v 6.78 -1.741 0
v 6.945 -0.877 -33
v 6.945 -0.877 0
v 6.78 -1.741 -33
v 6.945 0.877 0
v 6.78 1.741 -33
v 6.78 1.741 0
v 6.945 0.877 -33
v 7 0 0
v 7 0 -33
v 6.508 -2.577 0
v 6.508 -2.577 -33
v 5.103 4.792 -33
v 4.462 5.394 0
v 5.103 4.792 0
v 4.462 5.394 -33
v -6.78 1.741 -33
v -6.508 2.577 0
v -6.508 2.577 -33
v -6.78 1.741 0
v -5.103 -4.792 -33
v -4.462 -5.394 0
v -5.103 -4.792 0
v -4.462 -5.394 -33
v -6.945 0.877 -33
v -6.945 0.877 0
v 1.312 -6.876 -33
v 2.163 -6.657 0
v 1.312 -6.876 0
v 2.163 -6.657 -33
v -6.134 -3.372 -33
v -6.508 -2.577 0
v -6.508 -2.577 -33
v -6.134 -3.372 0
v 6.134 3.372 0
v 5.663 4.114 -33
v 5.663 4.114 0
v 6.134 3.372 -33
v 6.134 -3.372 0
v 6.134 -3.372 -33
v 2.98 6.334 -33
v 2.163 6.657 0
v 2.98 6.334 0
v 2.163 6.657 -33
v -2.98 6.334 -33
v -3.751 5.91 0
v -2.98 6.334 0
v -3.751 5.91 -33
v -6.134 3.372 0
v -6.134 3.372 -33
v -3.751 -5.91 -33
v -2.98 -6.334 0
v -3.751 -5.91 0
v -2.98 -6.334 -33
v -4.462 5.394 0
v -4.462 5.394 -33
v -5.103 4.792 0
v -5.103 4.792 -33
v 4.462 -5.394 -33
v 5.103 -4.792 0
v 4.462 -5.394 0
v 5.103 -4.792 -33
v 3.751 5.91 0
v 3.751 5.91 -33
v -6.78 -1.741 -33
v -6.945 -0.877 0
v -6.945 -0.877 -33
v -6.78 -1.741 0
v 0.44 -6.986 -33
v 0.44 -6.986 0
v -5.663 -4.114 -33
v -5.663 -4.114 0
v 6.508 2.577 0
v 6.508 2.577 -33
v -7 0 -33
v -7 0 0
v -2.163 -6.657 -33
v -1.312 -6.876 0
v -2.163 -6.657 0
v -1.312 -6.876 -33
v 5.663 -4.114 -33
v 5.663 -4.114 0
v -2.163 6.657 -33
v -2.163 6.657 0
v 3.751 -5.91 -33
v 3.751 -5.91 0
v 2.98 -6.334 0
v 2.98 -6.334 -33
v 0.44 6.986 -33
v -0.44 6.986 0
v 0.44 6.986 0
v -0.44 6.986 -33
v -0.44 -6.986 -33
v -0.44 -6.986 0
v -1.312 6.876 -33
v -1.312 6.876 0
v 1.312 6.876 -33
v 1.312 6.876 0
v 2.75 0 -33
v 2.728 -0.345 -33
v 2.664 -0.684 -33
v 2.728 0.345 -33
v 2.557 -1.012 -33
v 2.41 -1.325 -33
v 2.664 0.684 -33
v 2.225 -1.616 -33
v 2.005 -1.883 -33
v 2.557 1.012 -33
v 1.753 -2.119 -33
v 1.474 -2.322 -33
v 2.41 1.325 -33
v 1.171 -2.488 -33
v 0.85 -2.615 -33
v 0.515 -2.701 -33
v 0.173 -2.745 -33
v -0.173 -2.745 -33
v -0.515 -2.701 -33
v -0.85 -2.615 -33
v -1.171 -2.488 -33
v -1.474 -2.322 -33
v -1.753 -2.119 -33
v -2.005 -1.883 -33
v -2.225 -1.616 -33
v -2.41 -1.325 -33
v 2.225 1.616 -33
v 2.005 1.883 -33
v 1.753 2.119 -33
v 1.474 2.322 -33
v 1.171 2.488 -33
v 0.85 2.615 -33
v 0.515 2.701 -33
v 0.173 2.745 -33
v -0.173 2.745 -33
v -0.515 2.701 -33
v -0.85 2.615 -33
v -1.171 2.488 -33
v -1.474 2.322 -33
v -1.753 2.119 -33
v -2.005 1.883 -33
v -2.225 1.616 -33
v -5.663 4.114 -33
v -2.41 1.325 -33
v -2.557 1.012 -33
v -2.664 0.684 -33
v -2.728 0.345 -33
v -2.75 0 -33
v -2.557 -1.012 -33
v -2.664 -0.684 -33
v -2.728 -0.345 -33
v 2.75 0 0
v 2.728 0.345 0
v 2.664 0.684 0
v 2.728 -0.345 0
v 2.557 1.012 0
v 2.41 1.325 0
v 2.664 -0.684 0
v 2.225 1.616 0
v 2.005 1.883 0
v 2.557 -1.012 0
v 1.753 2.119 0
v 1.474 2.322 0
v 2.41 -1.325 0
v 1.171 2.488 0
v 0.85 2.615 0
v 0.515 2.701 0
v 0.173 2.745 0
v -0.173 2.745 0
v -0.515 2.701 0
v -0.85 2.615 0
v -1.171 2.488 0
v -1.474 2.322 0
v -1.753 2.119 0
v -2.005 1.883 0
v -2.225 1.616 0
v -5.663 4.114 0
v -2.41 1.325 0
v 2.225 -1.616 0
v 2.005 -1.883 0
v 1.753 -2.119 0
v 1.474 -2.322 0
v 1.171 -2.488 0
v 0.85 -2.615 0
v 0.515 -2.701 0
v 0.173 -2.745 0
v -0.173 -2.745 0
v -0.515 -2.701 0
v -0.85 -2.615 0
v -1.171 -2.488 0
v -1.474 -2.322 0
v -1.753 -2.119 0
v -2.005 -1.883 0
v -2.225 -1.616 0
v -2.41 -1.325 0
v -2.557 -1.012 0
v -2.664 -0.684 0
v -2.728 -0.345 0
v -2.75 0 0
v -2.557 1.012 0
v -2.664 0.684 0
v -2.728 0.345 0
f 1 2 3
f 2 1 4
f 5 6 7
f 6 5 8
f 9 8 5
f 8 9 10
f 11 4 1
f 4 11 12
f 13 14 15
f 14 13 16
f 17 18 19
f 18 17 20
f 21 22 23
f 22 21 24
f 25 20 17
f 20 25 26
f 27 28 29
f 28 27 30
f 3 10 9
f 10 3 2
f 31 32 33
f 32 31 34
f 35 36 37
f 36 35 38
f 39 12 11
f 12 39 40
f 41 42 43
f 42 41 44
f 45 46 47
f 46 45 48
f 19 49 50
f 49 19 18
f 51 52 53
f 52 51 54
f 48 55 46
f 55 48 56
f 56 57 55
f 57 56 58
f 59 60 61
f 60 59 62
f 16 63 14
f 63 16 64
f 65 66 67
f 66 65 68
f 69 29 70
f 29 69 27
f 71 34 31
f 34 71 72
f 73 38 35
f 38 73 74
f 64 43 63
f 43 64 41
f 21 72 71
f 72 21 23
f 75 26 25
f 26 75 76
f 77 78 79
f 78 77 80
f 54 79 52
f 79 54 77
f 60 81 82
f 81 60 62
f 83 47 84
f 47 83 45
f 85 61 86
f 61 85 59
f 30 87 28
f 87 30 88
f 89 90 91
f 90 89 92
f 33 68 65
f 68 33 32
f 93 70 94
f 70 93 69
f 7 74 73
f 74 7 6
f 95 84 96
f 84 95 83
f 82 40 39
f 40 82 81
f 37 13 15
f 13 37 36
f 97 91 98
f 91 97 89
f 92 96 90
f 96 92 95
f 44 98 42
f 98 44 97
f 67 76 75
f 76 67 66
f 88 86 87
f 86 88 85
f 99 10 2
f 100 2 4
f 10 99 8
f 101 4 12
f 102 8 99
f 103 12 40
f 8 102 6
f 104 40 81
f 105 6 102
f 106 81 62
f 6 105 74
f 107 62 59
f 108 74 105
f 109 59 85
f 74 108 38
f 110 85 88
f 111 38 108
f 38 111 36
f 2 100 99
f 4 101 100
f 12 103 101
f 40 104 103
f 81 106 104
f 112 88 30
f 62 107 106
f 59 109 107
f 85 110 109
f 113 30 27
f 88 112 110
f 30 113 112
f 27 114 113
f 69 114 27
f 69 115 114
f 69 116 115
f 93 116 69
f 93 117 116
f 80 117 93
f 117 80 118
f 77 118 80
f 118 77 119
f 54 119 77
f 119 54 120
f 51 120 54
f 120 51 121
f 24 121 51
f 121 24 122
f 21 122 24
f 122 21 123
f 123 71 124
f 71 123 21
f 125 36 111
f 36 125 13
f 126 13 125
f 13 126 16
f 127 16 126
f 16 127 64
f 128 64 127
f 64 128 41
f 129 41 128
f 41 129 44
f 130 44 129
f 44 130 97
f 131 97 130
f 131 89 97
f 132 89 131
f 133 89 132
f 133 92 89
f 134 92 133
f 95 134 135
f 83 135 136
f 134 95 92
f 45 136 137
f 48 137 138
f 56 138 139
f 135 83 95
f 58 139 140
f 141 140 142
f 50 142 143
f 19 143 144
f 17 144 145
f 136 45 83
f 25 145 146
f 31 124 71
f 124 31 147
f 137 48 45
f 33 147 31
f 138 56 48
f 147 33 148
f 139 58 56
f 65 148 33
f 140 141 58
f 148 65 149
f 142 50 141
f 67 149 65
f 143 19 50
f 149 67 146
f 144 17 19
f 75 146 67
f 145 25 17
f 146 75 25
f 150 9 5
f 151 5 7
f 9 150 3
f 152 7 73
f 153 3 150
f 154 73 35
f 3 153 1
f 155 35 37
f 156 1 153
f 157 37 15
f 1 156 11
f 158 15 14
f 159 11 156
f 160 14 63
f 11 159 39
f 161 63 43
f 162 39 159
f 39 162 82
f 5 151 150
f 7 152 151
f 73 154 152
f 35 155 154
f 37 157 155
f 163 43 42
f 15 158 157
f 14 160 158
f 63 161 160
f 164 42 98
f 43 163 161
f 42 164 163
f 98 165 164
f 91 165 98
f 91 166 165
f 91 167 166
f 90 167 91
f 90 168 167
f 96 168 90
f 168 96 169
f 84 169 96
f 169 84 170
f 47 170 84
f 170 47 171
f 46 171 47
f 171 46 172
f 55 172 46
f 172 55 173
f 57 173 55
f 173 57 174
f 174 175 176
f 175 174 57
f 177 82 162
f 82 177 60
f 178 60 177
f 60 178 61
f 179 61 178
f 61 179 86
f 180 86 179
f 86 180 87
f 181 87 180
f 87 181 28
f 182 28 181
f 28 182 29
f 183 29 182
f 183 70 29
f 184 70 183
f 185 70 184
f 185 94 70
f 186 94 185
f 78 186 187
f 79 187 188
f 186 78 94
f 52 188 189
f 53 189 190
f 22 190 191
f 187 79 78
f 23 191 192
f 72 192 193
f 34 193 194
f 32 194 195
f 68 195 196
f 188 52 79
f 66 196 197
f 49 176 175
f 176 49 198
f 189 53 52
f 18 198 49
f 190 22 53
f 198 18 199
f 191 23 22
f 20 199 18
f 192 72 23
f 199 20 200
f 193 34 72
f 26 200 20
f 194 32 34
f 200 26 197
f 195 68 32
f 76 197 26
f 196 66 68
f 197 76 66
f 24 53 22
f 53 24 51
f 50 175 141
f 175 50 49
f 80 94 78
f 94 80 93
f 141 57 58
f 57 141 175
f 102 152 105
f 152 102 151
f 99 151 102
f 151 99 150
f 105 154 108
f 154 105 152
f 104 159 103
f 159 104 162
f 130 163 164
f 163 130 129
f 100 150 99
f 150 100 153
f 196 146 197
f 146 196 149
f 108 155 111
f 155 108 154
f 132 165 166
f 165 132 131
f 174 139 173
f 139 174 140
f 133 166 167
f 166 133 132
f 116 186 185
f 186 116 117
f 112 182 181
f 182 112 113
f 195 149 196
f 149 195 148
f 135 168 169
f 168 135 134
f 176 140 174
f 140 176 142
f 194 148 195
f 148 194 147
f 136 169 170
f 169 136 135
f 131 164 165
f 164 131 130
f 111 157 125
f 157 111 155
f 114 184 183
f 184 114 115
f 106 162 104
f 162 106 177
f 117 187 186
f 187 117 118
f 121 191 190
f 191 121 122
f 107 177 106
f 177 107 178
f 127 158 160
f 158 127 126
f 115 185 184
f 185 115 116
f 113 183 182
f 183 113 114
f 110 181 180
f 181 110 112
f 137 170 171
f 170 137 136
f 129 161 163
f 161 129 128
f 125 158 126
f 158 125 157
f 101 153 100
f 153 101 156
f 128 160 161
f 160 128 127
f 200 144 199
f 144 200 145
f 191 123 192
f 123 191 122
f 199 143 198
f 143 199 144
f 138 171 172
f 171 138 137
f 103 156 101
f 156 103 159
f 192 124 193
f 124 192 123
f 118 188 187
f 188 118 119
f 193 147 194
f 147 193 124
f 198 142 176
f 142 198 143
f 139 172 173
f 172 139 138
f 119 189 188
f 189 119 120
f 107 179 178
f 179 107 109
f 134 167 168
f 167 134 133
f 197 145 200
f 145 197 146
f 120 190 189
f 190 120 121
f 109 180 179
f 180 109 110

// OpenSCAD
$fn = 50;


difference() {
	union() {
		translate(v = [0, 0, -33.0000000000]) {
			cylinder(h = 33, r = 7.0000000000);
		}
		cylinder(h = 0, r = 13.0000000000);
	}
	union() {
		#translate(v = [0, 0, -33]) {
			cylinder(h = 33, r = 2.7500000000);
		}
	}
}
